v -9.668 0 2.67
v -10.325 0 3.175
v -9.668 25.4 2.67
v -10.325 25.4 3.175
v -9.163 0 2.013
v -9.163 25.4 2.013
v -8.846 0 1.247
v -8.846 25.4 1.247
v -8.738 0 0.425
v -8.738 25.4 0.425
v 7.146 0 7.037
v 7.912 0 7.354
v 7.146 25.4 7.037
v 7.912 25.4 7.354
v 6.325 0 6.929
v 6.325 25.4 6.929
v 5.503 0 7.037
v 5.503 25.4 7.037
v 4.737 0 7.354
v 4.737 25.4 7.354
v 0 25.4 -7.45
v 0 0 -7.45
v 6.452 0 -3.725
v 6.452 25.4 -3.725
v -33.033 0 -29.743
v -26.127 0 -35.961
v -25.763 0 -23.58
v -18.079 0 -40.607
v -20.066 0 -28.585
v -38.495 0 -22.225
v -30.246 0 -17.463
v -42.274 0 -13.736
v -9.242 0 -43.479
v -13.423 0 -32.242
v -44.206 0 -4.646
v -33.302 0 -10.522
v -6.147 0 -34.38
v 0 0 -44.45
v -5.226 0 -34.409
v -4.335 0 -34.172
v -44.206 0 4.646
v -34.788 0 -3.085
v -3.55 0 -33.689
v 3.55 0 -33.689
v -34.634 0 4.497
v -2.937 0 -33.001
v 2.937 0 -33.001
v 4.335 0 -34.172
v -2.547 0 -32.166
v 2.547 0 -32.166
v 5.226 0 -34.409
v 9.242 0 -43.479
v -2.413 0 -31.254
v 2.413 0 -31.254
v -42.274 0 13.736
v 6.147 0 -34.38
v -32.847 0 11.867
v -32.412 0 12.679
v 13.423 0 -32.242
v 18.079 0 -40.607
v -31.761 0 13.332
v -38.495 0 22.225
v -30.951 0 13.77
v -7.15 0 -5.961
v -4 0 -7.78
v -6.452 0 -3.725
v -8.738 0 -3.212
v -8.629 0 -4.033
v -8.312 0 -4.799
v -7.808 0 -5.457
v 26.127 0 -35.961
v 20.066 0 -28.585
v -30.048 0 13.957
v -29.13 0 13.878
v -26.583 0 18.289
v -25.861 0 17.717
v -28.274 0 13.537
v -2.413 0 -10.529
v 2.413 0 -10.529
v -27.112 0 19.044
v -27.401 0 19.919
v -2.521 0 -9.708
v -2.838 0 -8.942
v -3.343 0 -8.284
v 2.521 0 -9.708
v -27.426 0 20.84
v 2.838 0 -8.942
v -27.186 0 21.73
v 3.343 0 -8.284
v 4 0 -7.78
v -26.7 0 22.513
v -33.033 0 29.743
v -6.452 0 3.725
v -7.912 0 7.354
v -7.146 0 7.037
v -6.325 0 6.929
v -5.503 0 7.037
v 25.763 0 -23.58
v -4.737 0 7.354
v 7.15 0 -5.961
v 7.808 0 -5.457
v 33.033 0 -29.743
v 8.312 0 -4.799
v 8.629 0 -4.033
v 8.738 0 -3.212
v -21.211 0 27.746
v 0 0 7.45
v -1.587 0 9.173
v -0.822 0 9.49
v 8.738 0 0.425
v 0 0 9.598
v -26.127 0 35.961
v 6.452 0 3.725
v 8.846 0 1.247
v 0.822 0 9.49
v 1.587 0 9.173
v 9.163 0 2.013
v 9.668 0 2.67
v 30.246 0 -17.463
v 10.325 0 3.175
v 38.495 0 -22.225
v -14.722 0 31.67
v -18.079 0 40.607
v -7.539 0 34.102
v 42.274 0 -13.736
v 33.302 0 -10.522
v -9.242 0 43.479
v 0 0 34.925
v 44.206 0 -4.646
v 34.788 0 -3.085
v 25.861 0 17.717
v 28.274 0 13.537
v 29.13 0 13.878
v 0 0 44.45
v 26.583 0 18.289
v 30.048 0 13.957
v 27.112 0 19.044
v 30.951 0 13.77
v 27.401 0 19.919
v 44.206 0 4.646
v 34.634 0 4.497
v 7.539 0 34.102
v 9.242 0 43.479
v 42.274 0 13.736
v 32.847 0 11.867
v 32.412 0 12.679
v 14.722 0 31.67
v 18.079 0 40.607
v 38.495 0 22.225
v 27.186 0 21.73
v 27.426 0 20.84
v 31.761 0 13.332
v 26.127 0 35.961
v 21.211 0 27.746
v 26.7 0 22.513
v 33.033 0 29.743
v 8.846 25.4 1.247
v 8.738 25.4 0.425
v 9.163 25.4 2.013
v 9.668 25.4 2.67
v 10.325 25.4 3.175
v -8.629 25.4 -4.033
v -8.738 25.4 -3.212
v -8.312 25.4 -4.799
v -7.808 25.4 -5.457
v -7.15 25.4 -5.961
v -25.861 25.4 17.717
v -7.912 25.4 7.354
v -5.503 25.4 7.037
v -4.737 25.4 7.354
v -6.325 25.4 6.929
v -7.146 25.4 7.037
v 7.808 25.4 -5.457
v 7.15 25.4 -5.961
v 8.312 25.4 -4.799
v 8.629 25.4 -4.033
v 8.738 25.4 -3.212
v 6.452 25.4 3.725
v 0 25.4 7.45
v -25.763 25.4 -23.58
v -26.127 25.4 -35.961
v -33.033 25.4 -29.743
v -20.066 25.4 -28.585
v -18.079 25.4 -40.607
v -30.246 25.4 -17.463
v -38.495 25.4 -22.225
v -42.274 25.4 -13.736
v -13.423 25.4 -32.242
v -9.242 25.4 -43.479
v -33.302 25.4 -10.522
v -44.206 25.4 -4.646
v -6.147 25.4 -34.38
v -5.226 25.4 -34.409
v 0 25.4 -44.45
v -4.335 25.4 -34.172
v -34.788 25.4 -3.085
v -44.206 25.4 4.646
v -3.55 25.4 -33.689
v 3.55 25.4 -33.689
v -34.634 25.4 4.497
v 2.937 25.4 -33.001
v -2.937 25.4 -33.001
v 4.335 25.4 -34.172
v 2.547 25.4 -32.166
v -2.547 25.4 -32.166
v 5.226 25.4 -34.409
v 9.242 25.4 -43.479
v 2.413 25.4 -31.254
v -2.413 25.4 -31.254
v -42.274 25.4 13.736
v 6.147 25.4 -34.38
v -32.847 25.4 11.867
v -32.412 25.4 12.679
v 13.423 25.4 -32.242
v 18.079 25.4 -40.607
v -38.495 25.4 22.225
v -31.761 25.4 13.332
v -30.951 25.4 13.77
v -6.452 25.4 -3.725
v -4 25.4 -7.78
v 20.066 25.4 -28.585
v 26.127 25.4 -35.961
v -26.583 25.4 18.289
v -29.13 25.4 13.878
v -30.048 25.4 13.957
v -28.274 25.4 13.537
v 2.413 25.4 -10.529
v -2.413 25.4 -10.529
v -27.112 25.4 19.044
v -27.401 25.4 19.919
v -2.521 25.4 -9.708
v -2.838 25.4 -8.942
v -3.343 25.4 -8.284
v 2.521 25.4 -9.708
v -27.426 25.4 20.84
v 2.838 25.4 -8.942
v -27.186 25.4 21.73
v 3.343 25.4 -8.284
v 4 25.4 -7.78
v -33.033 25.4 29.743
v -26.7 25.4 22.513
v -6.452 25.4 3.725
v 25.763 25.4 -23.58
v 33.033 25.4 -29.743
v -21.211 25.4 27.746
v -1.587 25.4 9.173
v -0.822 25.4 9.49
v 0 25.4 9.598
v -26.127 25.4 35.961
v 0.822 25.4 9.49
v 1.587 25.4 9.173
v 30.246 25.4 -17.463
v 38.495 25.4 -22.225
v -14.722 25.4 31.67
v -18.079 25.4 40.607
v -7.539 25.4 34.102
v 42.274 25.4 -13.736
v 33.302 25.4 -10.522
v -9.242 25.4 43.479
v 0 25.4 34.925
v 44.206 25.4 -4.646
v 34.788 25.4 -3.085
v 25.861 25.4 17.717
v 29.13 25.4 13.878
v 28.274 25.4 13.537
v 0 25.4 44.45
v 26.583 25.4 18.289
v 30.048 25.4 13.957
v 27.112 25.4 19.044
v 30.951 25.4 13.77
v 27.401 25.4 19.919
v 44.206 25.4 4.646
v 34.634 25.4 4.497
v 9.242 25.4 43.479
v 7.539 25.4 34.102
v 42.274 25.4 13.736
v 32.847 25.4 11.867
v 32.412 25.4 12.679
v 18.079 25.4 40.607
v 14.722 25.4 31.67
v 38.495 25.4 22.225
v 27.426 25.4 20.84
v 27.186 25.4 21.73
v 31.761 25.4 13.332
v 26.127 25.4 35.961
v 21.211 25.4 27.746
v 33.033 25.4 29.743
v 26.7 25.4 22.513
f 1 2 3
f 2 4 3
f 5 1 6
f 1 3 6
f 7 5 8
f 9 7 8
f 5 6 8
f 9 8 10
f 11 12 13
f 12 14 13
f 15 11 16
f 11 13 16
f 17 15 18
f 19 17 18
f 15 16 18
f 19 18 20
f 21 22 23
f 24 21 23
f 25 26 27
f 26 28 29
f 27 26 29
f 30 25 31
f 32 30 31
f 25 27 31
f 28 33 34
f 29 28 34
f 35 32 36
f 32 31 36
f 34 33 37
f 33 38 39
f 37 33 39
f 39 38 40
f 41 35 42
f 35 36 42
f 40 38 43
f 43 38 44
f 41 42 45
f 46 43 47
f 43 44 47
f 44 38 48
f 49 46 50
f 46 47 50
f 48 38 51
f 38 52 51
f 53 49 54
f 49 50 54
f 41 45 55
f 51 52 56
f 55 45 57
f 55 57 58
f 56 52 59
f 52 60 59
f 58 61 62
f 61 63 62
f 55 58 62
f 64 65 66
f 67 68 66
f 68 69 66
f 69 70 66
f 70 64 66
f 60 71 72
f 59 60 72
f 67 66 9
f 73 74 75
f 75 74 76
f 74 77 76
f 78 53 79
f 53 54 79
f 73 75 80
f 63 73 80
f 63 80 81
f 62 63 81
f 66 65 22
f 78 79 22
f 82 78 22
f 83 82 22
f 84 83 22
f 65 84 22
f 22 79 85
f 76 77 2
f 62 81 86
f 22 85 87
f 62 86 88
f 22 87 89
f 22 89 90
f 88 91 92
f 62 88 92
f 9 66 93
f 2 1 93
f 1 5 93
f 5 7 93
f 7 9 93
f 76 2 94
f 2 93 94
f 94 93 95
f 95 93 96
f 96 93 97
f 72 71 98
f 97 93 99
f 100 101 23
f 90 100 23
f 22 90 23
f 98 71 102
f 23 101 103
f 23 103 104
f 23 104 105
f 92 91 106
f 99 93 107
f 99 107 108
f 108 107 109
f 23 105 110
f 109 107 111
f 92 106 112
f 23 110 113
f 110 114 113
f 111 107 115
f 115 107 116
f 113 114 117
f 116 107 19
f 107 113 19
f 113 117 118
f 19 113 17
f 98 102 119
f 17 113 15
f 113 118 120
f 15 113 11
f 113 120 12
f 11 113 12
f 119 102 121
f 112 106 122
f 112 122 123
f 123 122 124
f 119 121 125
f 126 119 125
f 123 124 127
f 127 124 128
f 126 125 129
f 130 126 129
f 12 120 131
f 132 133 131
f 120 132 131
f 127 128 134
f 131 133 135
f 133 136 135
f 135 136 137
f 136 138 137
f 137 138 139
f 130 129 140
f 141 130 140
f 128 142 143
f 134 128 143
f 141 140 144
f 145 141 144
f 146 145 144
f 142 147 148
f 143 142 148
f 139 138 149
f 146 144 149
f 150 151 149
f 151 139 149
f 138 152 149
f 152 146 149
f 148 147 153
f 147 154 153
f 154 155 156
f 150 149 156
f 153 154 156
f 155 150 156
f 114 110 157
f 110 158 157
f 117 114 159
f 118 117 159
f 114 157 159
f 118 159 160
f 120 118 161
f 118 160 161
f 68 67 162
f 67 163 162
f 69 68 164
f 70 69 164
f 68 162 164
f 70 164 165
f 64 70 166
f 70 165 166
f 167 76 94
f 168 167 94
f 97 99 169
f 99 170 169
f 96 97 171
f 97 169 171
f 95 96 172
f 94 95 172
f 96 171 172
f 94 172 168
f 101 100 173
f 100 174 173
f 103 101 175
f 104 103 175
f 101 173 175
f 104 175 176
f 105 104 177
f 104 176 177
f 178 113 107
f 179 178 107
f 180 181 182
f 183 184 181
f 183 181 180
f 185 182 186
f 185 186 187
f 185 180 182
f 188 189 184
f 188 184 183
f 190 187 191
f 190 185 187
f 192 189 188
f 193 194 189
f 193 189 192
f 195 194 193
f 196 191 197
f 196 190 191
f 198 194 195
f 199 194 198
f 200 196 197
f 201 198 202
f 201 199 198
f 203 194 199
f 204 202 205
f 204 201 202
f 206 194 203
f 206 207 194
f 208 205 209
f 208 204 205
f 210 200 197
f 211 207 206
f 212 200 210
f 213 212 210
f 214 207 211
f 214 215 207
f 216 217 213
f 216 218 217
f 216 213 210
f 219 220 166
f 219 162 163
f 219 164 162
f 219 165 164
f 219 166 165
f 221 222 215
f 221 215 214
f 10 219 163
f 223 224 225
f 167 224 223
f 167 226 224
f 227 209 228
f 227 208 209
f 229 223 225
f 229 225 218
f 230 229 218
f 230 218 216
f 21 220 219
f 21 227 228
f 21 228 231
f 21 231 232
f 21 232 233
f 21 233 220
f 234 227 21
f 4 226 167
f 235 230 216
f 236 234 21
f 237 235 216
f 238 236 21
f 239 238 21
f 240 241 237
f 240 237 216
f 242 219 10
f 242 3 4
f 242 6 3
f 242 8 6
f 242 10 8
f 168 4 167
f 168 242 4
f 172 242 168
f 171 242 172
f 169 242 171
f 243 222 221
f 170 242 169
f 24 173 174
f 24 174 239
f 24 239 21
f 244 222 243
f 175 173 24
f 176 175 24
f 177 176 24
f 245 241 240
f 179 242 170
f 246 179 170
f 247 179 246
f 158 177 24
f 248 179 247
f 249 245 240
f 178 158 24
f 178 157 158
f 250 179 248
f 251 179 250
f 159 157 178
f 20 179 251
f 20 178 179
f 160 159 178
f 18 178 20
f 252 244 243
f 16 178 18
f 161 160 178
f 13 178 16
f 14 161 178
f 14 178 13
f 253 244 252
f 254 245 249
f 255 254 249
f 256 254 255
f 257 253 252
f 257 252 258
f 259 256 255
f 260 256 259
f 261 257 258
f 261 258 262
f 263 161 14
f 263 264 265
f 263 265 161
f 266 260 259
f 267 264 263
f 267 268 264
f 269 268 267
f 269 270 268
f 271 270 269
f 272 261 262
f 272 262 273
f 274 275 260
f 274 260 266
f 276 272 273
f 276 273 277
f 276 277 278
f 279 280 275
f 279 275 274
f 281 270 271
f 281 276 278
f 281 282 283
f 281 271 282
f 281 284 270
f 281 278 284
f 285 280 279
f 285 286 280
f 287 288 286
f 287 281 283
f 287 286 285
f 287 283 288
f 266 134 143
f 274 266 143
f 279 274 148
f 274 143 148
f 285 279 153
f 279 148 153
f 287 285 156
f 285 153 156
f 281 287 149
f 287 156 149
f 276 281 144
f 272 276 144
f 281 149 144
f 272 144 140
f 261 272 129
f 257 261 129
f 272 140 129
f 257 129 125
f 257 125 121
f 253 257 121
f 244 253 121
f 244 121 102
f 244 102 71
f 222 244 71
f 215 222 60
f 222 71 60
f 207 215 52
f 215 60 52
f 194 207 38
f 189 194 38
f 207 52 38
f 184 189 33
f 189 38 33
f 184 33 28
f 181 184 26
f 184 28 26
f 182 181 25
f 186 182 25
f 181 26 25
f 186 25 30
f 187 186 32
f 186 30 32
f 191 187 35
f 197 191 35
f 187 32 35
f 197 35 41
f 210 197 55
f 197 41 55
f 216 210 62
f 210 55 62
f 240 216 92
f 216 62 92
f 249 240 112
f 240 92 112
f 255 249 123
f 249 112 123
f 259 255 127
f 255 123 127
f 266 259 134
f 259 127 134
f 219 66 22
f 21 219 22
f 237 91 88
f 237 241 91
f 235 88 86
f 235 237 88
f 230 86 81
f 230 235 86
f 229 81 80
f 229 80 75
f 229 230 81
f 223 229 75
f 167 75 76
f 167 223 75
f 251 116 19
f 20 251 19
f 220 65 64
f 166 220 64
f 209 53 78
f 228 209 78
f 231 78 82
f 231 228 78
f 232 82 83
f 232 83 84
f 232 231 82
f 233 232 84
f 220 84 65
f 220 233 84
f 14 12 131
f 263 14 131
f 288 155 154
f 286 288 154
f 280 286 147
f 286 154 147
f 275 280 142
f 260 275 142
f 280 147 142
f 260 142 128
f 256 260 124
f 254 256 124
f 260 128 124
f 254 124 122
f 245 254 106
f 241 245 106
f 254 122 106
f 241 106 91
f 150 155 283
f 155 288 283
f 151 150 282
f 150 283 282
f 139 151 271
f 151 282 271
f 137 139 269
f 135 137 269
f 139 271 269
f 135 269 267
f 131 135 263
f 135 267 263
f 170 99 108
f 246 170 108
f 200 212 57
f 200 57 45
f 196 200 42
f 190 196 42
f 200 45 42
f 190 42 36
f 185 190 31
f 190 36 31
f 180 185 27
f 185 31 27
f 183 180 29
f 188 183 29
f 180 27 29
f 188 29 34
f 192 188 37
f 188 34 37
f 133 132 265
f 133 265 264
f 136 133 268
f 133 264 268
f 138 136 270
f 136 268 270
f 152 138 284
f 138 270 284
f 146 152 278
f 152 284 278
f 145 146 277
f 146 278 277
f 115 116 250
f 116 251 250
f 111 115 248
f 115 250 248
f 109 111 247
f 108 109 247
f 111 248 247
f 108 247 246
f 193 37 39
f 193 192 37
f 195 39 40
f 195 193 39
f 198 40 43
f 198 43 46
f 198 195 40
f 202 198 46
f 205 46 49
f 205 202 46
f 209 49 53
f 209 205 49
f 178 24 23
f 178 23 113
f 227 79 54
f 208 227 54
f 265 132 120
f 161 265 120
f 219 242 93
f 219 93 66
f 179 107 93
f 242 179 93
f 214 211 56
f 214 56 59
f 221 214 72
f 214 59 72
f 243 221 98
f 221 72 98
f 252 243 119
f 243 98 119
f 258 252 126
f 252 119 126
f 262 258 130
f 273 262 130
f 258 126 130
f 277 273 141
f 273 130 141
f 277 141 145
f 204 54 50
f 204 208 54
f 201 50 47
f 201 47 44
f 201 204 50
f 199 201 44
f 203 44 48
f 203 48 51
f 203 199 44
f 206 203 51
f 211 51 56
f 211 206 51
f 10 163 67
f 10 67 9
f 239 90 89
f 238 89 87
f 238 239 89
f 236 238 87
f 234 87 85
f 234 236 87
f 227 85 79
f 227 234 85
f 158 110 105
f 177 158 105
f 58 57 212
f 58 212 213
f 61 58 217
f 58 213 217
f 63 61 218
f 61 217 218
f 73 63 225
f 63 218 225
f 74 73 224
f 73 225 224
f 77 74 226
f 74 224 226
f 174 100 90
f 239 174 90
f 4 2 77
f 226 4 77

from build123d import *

# Parameters (mm, degrees)
SKETCH1_R           = 44.45
BOSS_EXTRUDE1_DEPTH = 25.4
FILLET1_R           = 3.175


with BuildPart() as part:
    # Sketch1 → Boss-Extrude1 (new body)
    with BuildSketch(Plane(origin=(0, 0, 0), x_dir=(1, 0, 0), z_dir=(0, 1, 0))):
        with Locations(Location((0, 0, 0), (0, 0, 270))):
            Circle(SKETCH1_R)
        Polygon((-6.4516, 3.724832997), (0, 7.449665993), (6.4516, 3.724832997), (6.4516, -3.724832997), (0, -7.449665993), (-6.4516, -3.724832997), align=None, mode=Mode.SUBTRACT)
        with BuildLine():
            Line((2.413, 8.696165225), (2.413, 34.841542101))
            ThreePointArc((2.413, 34.841542101), (30.245937227, 17.4625), (31.380160567, -15.331051751))
            Line((31.380160567, -15.331051751), (8.7376, -2.258363313))
            Line((8.7376, -2.258363313), (8.7376, 5.044655712))
            Line((8.7376, 5.044655712), (2.413, 8.696165225))
        make_face(mode=Mode.SUBTRACT)
        with BuildLine():
            Line((-2.413, 34.841542101), (-2.413, 8.696165225))
            Line((-2.413, 8.696165225), (-8.7376, 5.044655712))
            Line((-8.7376, 5.044655712), (-8.7376, -2.258363313))
            Line((-8.7376, -2.258363313), (-31.380160567, -15.331051751))
            ThreePointArc((-31.380160567, -15.331051751), (-30.245937227, 17.4625), (-2.413, 34.841542101))
        make_face(mode=Mode.SUBTRACT)
        with BuildLine():
            Line((-28.967160567, -19.51049035), (-6.3246, -6.437801912))
            Line((-6.3246, -6.437801912), (0, -10.089311424))
            Line((0, -10.089311424), (6.3246, -6.437801912))
            Line((6.3246, -6.437801912), (28.967160567, -19.51049035))
            ThreePointArc((28.967160567, -19.51049035), (0, -34.925), (-28.967160567, -19.51049035))
        make_face(mode=Mode.SUBTRACT)
    extrude(amount=BOSS_EXTRUDE1_DEPTH)

    # Fillet1
    fillet1_edges = [part.edges().sort_by_distance(p)[0] for p in [
        (-8.7376, 12.7, -5.044655712),
        (-2.413, 12.7, -8.696165225),
        (-2.413, 12.7, -34.841542101),
        (-31.380160567, 12.7, 15.331051751),
        (-8.7376, 12.7, 2.258363313),
        (31.380160567, 12.7, 15.331051751),
        (2.413, 12.7, -34.841542101),
        (2.413, 12.7, -8.696165225),
        (8.7376, 12.7, -5.044655712),
        (8.7376, 12.7, 2.258363313),
        (-28.967160567, 12.7, 19.51049035),
        (28.967160567, 12.7, 19.51049035),
        (6.3246, 12.7, 6.437801912),
        (0, 12.7, 10.089311424),
        (-6.3246, 12.7, 6.437801912),
    ]]
    fillet(fillet1_edges, radius=FILLET1_R)


solid = part.part
